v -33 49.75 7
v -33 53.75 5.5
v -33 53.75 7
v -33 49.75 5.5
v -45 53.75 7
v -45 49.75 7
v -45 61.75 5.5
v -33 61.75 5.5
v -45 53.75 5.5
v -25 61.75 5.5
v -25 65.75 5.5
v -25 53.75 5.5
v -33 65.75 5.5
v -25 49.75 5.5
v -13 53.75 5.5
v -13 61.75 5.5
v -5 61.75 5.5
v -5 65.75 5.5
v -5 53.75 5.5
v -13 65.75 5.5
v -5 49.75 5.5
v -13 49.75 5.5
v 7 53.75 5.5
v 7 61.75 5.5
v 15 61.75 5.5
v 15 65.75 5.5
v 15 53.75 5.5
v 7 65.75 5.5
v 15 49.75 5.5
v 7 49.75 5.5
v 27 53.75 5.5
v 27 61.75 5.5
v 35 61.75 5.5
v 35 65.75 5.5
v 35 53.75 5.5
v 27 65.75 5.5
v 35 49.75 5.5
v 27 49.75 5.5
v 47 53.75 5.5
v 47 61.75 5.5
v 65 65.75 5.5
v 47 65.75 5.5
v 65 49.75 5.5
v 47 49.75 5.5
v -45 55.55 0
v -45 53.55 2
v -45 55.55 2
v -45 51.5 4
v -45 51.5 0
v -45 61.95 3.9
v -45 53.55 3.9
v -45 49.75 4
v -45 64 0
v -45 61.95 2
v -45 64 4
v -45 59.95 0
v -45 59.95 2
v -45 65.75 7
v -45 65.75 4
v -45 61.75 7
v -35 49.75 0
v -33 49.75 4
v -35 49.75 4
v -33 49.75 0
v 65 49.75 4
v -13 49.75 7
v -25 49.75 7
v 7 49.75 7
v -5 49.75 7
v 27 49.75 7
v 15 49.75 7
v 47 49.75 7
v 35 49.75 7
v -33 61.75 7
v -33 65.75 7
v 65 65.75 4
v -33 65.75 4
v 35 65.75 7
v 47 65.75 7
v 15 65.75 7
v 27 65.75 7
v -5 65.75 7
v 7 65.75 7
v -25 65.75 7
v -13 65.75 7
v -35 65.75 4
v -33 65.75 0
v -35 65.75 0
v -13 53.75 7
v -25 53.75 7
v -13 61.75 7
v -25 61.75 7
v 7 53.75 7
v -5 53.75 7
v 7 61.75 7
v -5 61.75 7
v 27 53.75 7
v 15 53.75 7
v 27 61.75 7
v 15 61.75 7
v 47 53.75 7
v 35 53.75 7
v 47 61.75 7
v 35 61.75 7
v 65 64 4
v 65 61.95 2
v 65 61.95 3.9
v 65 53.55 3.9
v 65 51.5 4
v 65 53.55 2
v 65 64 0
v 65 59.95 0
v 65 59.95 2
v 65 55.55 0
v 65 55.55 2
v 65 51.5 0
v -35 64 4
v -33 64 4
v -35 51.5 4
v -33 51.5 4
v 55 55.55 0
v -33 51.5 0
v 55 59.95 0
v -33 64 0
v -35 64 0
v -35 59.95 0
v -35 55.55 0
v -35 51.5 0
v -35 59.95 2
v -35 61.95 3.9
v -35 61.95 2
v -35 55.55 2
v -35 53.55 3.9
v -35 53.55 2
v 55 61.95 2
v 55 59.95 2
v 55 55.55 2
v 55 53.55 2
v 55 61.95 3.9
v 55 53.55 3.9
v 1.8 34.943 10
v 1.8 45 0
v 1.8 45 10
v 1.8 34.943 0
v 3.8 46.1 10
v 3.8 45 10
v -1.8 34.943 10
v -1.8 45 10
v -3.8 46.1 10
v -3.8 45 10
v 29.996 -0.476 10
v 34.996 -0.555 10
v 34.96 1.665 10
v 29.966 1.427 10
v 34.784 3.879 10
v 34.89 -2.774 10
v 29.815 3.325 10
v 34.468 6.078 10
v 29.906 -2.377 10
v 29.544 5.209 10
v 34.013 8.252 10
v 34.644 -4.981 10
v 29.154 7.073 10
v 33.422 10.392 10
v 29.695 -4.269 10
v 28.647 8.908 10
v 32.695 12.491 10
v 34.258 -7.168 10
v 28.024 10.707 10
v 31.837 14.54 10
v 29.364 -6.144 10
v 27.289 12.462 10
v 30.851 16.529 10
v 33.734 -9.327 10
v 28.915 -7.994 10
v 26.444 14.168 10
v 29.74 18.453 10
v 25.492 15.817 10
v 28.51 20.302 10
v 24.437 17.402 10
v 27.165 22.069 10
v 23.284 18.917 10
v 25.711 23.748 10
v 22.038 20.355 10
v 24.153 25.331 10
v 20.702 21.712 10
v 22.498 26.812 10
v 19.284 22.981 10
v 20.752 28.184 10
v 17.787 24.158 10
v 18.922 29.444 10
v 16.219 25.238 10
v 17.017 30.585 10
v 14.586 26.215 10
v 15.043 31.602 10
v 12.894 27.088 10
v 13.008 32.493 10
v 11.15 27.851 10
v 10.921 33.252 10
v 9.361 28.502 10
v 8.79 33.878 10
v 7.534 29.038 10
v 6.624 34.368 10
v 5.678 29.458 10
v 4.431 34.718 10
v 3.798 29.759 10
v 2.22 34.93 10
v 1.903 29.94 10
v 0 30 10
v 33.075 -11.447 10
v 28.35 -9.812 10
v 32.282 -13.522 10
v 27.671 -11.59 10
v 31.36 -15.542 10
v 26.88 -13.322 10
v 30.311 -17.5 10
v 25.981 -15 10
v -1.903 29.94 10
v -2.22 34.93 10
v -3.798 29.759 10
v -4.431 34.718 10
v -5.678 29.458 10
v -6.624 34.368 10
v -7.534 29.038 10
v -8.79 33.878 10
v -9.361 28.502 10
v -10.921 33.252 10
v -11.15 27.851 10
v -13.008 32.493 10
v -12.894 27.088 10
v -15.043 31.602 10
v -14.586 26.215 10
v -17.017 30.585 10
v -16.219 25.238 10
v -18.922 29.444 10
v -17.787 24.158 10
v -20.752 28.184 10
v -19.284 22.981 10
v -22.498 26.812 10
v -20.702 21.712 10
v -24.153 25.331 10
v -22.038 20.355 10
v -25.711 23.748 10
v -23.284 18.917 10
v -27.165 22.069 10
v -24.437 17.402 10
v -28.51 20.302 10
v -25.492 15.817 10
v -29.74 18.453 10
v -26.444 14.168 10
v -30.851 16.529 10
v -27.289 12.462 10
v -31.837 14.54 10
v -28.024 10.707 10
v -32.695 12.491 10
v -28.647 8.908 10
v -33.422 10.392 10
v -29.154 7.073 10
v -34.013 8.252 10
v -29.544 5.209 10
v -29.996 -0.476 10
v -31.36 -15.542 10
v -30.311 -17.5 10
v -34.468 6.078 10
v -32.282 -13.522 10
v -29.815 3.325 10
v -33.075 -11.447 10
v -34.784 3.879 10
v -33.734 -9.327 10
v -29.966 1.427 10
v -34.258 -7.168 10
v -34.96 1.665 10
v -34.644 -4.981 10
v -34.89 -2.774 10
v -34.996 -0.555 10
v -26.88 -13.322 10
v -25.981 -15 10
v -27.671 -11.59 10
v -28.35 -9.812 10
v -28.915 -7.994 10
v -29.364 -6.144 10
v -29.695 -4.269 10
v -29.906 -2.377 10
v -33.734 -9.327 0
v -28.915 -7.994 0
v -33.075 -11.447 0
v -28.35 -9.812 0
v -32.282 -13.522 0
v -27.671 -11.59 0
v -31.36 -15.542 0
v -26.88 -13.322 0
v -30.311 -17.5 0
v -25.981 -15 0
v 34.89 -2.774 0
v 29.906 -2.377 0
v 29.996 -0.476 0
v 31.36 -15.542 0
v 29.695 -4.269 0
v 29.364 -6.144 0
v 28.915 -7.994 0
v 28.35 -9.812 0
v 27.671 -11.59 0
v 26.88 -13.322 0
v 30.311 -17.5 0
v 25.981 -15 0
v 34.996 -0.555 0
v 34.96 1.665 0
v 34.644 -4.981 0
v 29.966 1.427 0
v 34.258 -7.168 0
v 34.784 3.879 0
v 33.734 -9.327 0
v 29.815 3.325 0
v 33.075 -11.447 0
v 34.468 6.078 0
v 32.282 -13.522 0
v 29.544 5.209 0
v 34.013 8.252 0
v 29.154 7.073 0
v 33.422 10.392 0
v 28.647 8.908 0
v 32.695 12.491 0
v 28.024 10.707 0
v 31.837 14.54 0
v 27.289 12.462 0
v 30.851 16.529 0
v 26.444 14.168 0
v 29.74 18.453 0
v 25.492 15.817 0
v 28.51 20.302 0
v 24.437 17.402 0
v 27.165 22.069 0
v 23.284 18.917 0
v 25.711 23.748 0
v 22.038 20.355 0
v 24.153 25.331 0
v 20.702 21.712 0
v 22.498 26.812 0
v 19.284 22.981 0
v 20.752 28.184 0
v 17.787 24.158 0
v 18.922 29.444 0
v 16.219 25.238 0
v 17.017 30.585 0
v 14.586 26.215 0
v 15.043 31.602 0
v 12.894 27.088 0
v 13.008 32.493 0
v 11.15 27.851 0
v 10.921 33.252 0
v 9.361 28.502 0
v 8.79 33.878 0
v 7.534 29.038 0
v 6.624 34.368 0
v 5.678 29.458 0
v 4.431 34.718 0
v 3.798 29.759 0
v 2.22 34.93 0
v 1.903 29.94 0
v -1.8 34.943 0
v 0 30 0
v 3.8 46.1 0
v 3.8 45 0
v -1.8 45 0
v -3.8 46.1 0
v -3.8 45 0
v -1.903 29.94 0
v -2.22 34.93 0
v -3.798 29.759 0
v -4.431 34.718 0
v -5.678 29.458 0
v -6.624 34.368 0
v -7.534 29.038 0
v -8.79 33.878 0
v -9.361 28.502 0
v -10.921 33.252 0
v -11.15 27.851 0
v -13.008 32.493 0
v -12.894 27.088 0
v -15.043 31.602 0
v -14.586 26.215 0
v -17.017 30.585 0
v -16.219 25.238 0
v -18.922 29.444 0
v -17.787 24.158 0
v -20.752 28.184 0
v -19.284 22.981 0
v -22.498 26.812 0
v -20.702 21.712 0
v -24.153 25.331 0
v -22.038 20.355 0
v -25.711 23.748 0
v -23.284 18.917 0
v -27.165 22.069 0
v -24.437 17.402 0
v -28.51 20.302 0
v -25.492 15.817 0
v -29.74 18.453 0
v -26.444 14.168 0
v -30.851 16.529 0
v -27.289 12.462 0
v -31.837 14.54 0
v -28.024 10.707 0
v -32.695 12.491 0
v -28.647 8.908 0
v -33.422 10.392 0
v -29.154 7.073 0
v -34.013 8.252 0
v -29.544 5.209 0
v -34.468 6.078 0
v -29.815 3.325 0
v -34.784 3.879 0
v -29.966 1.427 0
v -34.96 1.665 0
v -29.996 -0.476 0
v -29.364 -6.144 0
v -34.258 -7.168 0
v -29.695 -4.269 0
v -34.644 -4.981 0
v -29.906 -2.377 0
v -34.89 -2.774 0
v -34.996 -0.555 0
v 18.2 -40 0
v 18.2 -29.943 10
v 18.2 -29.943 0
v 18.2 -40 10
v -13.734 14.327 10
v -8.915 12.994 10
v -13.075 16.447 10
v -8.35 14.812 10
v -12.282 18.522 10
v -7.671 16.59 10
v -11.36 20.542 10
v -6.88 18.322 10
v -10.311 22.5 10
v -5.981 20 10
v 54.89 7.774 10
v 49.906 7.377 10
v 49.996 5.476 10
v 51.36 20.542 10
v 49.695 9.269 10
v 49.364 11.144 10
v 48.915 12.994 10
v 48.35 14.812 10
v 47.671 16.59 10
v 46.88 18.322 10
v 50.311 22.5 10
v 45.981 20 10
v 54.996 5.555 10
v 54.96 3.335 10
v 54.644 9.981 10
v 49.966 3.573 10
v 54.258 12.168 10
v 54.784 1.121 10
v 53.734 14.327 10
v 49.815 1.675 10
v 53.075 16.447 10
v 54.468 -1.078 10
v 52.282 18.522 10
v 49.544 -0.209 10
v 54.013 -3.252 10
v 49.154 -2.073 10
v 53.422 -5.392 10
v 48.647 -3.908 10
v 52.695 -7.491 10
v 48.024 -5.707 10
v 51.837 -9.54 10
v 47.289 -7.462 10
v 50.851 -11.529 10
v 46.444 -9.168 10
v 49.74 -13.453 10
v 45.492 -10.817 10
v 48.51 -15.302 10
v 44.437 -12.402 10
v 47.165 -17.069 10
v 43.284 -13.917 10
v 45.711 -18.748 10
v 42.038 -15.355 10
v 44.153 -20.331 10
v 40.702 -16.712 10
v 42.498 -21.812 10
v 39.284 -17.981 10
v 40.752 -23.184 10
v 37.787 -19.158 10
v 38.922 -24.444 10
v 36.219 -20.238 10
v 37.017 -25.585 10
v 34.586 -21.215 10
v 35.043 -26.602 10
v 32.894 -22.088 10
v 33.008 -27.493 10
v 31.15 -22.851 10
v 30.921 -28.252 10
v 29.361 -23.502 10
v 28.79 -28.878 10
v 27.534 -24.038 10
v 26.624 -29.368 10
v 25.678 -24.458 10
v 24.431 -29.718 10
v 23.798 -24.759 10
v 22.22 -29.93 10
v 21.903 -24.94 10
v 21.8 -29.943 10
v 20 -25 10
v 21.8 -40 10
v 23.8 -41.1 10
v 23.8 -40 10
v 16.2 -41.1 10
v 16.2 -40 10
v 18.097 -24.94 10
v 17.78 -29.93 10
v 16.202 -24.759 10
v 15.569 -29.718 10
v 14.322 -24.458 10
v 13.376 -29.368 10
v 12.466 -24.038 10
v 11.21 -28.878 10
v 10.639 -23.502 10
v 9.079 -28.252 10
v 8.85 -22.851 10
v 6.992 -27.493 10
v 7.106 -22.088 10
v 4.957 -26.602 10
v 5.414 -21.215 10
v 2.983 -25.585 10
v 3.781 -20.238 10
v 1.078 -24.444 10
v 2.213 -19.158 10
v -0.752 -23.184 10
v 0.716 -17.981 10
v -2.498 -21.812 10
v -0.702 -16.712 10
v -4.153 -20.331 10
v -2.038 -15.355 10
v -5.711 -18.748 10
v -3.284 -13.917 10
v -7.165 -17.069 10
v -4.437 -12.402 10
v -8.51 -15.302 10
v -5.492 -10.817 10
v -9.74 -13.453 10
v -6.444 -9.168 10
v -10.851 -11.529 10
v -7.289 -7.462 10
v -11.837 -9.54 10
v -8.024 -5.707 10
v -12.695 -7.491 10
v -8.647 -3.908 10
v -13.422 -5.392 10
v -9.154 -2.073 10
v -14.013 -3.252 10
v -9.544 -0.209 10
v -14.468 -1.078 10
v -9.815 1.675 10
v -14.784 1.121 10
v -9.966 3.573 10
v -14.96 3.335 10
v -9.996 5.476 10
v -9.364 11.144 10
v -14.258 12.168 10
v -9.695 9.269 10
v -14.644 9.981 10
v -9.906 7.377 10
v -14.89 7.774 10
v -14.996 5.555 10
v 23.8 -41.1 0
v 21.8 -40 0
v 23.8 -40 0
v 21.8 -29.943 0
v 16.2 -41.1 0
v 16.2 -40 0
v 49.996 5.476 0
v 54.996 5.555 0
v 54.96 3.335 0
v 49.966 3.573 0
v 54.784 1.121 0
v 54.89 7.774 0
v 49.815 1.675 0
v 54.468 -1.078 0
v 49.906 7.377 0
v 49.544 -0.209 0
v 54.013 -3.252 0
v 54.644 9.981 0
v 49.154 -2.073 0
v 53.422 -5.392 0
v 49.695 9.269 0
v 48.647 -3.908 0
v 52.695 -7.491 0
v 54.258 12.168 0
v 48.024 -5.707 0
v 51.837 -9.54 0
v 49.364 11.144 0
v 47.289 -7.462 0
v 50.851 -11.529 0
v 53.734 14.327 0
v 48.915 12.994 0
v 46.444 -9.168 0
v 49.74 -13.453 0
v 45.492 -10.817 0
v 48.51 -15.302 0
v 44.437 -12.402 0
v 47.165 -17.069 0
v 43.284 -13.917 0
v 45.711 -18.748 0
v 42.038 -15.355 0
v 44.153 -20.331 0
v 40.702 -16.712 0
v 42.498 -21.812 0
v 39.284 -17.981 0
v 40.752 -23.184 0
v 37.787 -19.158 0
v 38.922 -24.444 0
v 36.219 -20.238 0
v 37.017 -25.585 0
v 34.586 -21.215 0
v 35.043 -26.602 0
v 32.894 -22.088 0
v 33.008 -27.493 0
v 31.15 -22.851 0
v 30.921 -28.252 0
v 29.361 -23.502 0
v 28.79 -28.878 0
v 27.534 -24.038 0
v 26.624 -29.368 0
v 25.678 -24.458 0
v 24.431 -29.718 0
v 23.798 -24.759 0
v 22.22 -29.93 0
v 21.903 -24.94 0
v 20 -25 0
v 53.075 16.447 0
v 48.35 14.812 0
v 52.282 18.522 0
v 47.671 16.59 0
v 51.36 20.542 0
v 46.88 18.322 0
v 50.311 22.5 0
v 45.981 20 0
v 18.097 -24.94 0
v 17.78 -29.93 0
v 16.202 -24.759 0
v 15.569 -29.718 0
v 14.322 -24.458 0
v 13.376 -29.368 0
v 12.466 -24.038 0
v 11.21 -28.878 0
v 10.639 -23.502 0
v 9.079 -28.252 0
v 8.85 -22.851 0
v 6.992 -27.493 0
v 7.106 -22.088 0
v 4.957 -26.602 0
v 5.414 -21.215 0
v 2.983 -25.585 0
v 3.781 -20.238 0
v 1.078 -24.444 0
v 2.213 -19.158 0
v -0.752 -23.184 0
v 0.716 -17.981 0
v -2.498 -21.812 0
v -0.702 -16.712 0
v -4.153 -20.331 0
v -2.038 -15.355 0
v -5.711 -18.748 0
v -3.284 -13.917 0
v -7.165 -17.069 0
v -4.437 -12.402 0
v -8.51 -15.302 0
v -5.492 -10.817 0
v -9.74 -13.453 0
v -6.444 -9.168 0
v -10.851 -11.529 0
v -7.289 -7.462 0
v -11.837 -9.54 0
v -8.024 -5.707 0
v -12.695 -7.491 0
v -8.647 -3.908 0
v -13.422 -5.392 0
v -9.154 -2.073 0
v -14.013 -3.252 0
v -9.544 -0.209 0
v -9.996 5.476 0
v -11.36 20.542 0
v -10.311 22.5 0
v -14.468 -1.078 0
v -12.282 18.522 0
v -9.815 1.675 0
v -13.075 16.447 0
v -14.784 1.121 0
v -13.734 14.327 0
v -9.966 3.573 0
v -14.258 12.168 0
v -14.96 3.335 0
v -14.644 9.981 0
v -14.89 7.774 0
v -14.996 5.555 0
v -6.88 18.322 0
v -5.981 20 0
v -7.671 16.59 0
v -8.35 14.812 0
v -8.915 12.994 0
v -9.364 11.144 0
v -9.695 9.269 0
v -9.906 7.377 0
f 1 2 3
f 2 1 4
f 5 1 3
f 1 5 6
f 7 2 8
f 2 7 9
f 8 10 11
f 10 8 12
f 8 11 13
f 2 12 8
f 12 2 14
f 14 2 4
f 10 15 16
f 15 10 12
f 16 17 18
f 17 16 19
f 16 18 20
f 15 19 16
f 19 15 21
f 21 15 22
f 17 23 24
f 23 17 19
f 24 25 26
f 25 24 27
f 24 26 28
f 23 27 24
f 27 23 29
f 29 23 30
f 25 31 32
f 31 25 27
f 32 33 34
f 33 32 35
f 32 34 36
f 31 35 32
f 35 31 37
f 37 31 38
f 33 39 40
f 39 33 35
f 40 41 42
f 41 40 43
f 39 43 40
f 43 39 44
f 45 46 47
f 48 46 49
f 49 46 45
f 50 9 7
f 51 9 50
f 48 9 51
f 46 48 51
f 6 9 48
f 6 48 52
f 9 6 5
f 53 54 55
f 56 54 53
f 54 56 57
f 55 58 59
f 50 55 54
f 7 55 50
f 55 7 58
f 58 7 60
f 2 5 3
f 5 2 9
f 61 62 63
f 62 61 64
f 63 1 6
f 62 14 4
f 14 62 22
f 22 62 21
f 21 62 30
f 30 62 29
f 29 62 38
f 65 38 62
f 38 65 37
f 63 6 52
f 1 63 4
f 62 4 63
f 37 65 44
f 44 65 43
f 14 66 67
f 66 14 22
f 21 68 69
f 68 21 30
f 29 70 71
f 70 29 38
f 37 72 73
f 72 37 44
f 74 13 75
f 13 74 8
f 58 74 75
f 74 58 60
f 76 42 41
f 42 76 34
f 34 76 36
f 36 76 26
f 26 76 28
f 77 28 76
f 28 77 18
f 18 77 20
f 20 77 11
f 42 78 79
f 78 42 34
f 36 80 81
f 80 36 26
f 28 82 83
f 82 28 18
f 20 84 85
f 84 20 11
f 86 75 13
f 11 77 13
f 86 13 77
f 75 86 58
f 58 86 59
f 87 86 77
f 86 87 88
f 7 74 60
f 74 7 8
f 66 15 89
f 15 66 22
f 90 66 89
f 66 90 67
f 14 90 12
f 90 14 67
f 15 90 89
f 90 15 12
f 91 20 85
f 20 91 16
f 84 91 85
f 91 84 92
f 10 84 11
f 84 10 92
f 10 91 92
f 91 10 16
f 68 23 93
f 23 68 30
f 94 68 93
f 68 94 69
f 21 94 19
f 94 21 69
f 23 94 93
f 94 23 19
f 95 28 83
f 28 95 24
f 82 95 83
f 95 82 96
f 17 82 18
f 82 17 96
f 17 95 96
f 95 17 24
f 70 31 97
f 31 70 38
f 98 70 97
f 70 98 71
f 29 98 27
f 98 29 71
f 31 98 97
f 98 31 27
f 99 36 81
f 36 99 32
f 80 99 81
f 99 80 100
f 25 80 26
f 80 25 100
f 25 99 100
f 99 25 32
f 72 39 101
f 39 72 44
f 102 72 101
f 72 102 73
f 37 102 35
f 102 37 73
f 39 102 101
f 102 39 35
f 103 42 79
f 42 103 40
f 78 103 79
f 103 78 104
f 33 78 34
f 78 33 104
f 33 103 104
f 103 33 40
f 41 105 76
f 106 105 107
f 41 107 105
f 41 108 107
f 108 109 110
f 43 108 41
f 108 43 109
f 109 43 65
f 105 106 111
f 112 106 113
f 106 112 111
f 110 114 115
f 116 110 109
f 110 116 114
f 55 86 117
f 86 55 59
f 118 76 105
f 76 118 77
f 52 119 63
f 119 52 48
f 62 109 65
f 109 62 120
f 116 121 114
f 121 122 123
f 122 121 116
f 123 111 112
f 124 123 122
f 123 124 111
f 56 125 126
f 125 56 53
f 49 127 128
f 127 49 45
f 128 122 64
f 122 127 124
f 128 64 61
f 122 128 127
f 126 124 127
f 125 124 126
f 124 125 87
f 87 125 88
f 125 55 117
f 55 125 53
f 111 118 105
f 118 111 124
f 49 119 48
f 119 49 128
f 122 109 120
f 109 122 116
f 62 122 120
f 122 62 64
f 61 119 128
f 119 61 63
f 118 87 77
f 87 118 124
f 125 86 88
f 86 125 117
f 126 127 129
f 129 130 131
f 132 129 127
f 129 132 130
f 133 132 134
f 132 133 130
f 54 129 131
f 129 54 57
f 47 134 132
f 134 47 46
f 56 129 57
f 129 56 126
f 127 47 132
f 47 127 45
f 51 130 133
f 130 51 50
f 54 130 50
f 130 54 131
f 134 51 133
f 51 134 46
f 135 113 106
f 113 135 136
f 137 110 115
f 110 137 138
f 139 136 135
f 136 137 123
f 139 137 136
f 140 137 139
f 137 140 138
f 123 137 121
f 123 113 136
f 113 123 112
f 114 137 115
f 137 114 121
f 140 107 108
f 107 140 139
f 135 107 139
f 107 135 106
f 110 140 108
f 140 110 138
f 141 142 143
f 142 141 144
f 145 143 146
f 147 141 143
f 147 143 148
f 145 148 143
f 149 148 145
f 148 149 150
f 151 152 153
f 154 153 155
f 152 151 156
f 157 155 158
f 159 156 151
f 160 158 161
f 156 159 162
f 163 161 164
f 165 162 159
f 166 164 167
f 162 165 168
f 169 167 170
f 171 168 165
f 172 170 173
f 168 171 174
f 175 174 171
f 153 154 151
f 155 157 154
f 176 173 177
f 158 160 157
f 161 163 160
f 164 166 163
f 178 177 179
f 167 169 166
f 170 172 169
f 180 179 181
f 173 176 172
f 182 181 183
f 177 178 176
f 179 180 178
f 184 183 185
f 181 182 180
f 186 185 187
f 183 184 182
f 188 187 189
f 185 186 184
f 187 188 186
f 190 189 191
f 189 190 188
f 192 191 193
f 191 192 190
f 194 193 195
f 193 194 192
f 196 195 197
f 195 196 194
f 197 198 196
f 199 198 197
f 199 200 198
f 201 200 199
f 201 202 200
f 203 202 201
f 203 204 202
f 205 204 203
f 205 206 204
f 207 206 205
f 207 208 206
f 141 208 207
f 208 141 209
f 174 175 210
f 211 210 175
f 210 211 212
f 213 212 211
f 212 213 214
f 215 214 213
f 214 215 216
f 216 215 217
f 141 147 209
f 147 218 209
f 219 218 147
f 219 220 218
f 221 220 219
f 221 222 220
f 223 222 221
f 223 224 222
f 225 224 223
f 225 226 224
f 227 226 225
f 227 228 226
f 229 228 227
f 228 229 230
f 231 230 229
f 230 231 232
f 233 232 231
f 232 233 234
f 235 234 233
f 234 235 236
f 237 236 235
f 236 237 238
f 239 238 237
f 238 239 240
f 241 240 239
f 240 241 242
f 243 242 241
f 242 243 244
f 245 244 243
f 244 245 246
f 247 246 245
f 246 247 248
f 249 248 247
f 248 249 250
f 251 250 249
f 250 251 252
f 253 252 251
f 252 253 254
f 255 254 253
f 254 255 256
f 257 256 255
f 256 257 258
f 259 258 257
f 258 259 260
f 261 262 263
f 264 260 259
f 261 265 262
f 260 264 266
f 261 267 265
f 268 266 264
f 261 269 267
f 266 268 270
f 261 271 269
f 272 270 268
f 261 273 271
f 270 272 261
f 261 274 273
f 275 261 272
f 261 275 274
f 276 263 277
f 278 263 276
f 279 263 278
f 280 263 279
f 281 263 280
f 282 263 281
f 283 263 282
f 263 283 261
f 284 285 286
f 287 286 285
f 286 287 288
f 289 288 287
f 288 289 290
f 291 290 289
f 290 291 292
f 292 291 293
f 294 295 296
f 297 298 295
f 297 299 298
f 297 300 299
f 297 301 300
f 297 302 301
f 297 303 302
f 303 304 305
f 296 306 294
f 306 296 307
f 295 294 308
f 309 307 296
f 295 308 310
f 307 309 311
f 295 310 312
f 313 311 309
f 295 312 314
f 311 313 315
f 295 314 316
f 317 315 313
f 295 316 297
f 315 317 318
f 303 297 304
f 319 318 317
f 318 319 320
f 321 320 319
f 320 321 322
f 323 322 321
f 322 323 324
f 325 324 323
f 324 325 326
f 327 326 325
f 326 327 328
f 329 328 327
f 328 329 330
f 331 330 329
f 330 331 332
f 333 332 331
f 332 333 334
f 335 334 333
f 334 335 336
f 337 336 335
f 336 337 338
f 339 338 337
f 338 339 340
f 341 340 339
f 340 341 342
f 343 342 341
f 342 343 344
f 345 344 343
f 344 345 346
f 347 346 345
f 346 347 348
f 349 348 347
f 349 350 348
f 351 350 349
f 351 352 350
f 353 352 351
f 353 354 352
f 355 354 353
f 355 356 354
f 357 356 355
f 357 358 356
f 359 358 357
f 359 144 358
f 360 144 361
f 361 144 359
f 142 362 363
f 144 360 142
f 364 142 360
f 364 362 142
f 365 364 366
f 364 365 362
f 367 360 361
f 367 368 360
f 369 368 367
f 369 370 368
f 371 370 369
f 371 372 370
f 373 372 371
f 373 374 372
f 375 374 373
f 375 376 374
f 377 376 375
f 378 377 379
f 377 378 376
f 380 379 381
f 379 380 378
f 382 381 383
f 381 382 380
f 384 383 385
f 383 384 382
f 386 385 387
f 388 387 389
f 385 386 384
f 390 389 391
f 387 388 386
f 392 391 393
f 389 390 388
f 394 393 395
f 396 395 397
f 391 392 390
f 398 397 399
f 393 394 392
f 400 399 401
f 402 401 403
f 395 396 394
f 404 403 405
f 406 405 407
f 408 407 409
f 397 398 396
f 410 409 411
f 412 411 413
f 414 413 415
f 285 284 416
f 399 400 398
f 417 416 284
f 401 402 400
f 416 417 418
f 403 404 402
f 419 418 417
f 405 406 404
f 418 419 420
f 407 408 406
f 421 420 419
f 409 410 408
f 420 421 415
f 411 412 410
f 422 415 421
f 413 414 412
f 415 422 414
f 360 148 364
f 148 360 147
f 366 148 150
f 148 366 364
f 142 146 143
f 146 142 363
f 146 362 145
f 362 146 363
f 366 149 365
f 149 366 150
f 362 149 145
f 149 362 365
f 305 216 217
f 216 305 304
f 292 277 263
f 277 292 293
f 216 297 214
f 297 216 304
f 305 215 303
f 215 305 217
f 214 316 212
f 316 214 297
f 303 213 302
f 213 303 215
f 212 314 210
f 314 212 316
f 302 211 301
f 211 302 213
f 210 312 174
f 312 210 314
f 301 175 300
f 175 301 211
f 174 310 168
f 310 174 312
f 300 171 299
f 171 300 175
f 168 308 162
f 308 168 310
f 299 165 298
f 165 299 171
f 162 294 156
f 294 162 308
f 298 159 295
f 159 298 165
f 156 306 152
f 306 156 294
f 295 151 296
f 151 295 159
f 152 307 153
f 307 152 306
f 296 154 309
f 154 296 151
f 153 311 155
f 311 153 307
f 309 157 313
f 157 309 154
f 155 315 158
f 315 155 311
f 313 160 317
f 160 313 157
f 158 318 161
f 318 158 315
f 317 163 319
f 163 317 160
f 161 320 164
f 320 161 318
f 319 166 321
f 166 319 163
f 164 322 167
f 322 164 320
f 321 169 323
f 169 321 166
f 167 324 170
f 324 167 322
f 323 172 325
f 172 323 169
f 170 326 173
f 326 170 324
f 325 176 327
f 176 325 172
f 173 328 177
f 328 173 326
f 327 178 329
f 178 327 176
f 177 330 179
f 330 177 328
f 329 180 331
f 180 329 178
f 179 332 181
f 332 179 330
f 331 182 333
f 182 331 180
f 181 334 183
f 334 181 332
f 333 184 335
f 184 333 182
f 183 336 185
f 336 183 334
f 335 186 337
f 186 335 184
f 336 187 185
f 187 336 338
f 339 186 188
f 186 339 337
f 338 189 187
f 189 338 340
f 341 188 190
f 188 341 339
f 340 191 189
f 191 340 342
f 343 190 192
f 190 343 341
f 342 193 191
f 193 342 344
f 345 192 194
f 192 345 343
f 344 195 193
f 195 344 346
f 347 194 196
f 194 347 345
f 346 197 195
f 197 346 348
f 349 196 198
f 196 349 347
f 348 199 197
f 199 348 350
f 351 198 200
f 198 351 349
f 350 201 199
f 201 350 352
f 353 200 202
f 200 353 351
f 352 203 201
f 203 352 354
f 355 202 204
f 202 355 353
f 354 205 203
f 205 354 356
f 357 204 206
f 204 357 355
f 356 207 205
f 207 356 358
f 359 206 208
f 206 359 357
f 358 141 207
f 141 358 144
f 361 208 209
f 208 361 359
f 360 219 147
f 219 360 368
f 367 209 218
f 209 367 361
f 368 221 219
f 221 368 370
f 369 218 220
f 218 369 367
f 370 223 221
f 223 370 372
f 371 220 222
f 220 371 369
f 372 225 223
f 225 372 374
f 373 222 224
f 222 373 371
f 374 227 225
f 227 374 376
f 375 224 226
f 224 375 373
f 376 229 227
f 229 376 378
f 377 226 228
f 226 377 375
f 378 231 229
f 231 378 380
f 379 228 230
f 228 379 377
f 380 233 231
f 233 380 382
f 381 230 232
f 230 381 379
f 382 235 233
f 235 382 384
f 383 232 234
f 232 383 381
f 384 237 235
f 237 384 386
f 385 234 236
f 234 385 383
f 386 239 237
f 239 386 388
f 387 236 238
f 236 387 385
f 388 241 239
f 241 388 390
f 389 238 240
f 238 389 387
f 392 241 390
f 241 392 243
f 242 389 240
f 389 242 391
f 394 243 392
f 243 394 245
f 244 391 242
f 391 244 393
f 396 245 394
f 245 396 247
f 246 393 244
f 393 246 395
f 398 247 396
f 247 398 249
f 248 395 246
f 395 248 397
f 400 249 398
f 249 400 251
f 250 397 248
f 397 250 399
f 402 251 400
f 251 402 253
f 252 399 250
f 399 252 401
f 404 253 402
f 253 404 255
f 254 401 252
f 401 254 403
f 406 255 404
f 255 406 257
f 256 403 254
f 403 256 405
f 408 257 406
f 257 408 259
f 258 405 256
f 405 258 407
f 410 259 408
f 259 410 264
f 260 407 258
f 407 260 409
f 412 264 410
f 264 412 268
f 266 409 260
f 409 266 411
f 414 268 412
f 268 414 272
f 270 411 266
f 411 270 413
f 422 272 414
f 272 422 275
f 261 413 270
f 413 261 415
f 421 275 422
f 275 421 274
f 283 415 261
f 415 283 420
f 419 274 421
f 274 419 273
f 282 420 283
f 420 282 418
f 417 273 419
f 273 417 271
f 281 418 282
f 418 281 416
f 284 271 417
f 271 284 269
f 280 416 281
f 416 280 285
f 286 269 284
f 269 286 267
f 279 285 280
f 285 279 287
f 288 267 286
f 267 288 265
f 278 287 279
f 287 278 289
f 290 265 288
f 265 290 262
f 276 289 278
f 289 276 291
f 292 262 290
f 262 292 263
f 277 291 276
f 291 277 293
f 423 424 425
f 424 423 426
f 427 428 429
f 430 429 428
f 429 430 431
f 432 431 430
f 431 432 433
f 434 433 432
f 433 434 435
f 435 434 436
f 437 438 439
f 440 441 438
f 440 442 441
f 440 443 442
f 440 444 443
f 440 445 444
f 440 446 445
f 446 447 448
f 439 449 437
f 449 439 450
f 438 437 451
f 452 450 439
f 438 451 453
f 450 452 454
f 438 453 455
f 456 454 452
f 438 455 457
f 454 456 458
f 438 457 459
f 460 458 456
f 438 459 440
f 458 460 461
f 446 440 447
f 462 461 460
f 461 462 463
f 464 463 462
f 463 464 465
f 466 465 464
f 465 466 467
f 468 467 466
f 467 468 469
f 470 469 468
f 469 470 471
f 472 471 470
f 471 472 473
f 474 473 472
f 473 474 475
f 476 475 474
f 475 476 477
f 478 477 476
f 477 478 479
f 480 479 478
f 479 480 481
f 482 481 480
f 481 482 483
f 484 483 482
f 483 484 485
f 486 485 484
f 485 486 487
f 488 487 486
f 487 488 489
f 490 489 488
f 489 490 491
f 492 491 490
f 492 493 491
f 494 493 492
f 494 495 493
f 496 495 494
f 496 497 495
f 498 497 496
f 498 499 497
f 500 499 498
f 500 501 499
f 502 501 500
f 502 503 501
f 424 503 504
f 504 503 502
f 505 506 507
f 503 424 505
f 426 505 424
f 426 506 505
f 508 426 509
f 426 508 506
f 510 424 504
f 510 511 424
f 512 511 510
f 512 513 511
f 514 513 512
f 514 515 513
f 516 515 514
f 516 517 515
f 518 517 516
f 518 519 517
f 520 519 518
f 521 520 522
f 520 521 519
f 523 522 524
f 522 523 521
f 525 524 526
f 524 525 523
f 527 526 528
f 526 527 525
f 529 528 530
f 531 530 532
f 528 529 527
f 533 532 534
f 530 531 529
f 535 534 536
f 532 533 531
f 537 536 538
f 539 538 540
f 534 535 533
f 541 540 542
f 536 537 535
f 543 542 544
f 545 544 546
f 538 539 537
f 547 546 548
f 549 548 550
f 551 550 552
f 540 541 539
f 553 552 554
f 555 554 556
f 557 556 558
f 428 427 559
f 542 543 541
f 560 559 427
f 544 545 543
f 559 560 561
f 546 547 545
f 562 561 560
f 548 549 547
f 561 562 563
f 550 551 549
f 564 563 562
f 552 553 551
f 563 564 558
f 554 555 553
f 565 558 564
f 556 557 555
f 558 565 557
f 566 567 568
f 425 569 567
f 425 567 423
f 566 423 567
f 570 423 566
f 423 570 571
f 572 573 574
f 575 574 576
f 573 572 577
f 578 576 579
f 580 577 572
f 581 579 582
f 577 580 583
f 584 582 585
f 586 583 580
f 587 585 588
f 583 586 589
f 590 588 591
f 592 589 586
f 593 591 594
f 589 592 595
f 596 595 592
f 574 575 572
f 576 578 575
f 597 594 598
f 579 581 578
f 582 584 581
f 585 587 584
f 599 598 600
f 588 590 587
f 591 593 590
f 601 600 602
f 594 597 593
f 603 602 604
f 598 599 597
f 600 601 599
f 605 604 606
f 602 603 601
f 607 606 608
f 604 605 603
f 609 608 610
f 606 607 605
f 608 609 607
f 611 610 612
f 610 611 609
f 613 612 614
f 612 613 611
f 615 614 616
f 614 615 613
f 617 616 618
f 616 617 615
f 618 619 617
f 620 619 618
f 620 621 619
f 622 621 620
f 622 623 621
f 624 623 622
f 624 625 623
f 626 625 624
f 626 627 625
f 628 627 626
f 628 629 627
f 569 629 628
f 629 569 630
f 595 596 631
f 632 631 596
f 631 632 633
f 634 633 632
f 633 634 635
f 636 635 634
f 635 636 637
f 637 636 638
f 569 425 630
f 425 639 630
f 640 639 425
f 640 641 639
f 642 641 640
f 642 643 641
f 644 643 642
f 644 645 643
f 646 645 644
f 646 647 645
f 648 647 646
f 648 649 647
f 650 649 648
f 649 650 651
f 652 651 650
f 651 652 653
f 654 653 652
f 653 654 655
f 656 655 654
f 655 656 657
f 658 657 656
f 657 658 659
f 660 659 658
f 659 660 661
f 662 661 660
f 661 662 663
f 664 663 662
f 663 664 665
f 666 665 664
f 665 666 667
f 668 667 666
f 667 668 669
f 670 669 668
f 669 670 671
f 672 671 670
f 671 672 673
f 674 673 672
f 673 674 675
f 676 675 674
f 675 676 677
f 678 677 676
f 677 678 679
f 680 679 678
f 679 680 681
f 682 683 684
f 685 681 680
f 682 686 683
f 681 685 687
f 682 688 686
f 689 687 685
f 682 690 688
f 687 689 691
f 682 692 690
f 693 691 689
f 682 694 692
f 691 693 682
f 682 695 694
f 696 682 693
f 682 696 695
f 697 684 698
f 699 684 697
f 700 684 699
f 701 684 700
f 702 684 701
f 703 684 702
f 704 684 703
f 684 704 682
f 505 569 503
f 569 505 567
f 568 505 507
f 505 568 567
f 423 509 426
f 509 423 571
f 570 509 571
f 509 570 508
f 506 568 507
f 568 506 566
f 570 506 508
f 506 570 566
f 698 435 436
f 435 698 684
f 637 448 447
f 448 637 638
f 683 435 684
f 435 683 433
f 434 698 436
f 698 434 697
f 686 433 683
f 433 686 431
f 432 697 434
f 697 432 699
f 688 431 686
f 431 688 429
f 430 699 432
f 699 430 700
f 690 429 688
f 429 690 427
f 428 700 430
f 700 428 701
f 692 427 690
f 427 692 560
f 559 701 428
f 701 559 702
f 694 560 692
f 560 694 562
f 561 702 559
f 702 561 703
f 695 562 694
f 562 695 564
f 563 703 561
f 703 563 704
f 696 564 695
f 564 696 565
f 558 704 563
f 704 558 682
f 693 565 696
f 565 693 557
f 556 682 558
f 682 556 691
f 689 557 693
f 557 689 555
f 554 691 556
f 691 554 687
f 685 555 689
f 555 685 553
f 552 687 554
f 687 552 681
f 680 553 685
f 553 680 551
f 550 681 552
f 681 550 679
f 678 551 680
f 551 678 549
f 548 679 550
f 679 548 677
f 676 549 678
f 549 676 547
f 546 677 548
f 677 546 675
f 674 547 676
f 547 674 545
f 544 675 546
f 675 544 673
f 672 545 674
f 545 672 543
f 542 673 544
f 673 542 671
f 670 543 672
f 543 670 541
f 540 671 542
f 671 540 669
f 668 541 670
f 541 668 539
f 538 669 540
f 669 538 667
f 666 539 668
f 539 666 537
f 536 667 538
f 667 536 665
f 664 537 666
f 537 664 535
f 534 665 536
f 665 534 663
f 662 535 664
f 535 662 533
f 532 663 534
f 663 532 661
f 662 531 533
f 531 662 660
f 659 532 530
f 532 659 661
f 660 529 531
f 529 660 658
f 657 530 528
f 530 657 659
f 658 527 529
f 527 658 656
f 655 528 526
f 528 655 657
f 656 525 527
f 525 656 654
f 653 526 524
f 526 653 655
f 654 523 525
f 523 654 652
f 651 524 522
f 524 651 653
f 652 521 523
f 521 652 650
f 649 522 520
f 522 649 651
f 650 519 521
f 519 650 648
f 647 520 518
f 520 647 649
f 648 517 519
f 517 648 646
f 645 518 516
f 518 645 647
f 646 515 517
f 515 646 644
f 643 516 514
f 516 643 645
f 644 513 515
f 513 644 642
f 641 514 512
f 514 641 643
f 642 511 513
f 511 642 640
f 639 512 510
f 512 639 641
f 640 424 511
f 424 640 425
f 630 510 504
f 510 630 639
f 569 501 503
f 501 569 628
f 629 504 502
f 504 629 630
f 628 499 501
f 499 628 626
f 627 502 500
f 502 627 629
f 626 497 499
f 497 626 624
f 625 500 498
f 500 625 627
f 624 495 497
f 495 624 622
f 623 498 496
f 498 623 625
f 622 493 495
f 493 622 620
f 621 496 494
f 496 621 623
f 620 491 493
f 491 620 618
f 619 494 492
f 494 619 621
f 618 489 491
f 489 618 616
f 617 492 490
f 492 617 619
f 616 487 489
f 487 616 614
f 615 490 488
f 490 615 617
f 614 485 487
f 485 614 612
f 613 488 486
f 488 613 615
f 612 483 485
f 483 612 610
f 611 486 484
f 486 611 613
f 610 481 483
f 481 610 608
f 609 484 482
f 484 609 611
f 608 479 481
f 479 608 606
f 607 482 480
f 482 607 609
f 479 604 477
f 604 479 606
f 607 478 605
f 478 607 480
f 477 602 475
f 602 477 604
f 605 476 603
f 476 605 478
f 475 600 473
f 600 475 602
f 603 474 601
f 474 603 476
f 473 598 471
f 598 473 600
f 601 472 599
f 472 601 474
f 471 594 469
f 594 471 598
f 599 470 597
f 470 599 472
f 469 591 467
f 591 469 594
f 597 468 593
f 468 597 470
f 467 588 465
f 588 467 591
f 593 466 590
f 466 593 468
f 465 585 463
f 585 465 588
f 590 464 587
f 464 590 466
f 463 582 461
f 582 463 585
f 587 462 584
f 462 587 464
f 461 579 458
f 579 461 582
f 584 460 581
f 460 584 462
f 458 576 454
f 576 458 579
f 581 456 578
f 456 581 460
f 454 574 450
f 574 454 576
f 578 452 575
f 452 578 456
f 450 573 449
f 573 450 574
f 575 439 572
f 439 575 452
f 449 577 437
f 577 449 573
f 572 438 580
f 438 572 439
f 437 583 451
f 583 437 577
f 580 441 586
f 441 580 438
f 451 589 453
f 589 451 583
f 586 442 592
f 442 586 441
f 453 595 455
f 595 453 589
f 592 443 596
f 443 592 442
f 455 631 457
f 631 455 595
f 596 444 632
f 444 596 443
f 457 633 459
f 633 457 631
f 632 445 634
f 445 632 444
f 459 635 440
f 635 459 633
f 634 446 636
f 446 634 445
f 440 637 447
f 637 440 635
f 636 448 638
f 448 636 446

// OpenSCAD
// Nerf rail adapter for vacuum cleaner hoses. Use wisely.
// Copyright 2019 Ben Kelley
// This work is licensed under the Creative Commons Attribution-ShareAlike 4.0 International License. To view a copy of this license, visit http://creativecommons.org/licenses/by-sa/4.0/

// Size of the tube it should fit around. This fits my Dyson nicely. You want a pretty exact fit for it to stay on the hose.
TubeDiameter=60; //[20:100]

// How far around the tube the clip stretches.
TubeDegrees=240; // [180:359]

// The width of the clip that goes around the hose.
ClipWidth=10; //[5:20]
// The thickness of the clip that goes around the hose. If you make it too thick it won't flex enough to fit.
ClipThickness=5; //[3:10]

// How long the entire rail is. You can make this shorter or longer to suit, but edit the number and size of bumps to match.
RailLength=110; //[50:200]

// The height of the thinner part of the rail. If you make this smaller than 4 then attachments will not fit on the rail, but you can make it thicker.
RailHeight=4;

// The width of the thinner part of the rail. If you make this wider than 12.5 then attachments will not fit on the rail, but you can make it thinner.
RailBaseWidth=12.5;

// How much overhang on each side for the top flange of the rail. The final width will be RailBaseWidth + 2 x RailWidthOverhang.
RailWidthOverhang=1.75;

// How thick is the top flange of the rail. Keep this at 1.5 to fit Nerf attachments.
RailOverhangHeight=1.5;

// How high are the bumps on the top of the rail. Keep this at 1.5 or below to fit Nerf attachments.
RailBumpHeight=1.5;

// How wide are the bumps on the top of the rail.
RailBumpWidth=4;

// How long are the bumps on the top of the rail.
RailBumpLength=12;
// How much space between the bumps on the top of the rail.
InterBumpSpacing=8;

// How many bumps to make on each side of the rail.
NumberRailBumps=5;

// For the notch where the clip slots into the rail, how thick is the top of the notch.
NotchTopHeight=1.5;
// For the notch where the clip slots into the rail, how wide is the top of the notch.
NotchTopWidth=8;
// For the notch where the clip slots into the rail, how thick is the base of the notch.
NotchBaseThickness=4;
// For the notch where the clip slots into the rail, how high above the clip does the notch sit. You can adust this to make the rail sit higer or lower on the vacuum tube.
NotchBaseHeightAboveRing=10;

// How much tolerance on the dimensions of the notch. If this were 0 the parts would need to be an exact fit. At 0.25, the parts woulnd't fit on my printer, but at 0.4 they are tight.
NotchTolerance = 0.4;

translate([RailLength * -0.5 + 10, TubeDiameter / 2 + NotchBaseHeightAboveRing + ClipThickness + NotchTopHeight + 5, 0]) {
    rail();
}
clips();


module rail() {
    difference() {
        union() {
            cube(size=[RailLength, RailBaseWidth, RailHeight]);
            translate([0, -RailWidthOverhang, RailHeight]) {
                cube(size=[RailLength, RailBaseWidth + (RailWidthOverhang * 2), RailOverhangHeight]);
            }
            railTopBumps();
            translate([ClipWidth, -RailWidthOverhang, 0]) {
                railStop();
            }
            translate([ClipWidth, RailBaseWidth, 0]) {
                railStop();
            }
        }
        translate([0, 0, 0]) {
            railNotch();
        }
        translate([RailLength - ClipWidth, 0, 0]) {
            railNotch();
        }
    }
}

module railStop() {
    cube(size=[2, RailWidthOverhang, RailHeight]);
}

module railNotch() {
    translate([0, (RailBaseWidth - (NotchTopWidth + NotchTolerance)) / 2, 0]) {
        union() {
            translate([0, (NotchTopWidth - (NotchBaseThickness + 0)) / 2, 0]) {
                cube(size=[ClipWidth, NotchBaseThickness + NotchTolerance, 2]);
            }
            translate([0, 0, 2]) {
                cube(size=[ClipWidth, NotchTopWidth + NotchTolerance, NotchTopHeight + NotchTolerance]);
            }
        }
    }
}

module railTopBumps() {
    translate([0, -RailWidthOverhang, RailHeight + RailOverhangHeight]) {
        for(i=[0:1:NumberRailBumps - 1]) {
            translate([i * (RailBumpLength + InterBumpSpacing), 0, 0]) {
                railTopBump();
                translate([0, RailBaseWidth + (2 * RailWidthOverhang) - RailBumpWidth, 0]) {
                    railTopBump();
                }
            }
        }
    }
}

module railTopBump() {
    cube(size=[RailBumpLength, RailBumpWidth, RailBumpHeight]);
}

module clips() {
    clip();
    translate([20, 5, 0]) {
        rotate([180, 180, 0]) {
            clip();
        }
    }
}

module clip() {
    union() {
        ring();
        notch();
    }
}

module ring() {
    // TODO Rotate incorrect?
    rotate([0, 0, (TubeDegrees - 180) / -2]) {
    rotate_extrude(angle=240, convexity = 5, $fn=100) {
        translate([TubeDiameter / 2, 0, 0]) {
            square(size=[ClipThickness, ClipWidth]);
        }
    }
    }
}

module notch() {
    translate([(NotchBaseThickness - NotchTolerance)/ -2, (TubeDiameter / 2) + ClipThickness - 0.5, 0]) {
        union() {
            cube(size=[NotchBaseThickness - NotchTolerance, NotchBaseHeightAboveRing + 0.5, ClipWidth]);
            translate([(NotchTopWidth - NotchBaseThickness) / -2, NotchBaseHeightAboveRing + 0.5, 0]) {
                cube(size=[NotchTopWidth - NotchTolerance, NotchTopHeight - NotchTolerance, ClipWidth]);
            }
        }        
    }
}
